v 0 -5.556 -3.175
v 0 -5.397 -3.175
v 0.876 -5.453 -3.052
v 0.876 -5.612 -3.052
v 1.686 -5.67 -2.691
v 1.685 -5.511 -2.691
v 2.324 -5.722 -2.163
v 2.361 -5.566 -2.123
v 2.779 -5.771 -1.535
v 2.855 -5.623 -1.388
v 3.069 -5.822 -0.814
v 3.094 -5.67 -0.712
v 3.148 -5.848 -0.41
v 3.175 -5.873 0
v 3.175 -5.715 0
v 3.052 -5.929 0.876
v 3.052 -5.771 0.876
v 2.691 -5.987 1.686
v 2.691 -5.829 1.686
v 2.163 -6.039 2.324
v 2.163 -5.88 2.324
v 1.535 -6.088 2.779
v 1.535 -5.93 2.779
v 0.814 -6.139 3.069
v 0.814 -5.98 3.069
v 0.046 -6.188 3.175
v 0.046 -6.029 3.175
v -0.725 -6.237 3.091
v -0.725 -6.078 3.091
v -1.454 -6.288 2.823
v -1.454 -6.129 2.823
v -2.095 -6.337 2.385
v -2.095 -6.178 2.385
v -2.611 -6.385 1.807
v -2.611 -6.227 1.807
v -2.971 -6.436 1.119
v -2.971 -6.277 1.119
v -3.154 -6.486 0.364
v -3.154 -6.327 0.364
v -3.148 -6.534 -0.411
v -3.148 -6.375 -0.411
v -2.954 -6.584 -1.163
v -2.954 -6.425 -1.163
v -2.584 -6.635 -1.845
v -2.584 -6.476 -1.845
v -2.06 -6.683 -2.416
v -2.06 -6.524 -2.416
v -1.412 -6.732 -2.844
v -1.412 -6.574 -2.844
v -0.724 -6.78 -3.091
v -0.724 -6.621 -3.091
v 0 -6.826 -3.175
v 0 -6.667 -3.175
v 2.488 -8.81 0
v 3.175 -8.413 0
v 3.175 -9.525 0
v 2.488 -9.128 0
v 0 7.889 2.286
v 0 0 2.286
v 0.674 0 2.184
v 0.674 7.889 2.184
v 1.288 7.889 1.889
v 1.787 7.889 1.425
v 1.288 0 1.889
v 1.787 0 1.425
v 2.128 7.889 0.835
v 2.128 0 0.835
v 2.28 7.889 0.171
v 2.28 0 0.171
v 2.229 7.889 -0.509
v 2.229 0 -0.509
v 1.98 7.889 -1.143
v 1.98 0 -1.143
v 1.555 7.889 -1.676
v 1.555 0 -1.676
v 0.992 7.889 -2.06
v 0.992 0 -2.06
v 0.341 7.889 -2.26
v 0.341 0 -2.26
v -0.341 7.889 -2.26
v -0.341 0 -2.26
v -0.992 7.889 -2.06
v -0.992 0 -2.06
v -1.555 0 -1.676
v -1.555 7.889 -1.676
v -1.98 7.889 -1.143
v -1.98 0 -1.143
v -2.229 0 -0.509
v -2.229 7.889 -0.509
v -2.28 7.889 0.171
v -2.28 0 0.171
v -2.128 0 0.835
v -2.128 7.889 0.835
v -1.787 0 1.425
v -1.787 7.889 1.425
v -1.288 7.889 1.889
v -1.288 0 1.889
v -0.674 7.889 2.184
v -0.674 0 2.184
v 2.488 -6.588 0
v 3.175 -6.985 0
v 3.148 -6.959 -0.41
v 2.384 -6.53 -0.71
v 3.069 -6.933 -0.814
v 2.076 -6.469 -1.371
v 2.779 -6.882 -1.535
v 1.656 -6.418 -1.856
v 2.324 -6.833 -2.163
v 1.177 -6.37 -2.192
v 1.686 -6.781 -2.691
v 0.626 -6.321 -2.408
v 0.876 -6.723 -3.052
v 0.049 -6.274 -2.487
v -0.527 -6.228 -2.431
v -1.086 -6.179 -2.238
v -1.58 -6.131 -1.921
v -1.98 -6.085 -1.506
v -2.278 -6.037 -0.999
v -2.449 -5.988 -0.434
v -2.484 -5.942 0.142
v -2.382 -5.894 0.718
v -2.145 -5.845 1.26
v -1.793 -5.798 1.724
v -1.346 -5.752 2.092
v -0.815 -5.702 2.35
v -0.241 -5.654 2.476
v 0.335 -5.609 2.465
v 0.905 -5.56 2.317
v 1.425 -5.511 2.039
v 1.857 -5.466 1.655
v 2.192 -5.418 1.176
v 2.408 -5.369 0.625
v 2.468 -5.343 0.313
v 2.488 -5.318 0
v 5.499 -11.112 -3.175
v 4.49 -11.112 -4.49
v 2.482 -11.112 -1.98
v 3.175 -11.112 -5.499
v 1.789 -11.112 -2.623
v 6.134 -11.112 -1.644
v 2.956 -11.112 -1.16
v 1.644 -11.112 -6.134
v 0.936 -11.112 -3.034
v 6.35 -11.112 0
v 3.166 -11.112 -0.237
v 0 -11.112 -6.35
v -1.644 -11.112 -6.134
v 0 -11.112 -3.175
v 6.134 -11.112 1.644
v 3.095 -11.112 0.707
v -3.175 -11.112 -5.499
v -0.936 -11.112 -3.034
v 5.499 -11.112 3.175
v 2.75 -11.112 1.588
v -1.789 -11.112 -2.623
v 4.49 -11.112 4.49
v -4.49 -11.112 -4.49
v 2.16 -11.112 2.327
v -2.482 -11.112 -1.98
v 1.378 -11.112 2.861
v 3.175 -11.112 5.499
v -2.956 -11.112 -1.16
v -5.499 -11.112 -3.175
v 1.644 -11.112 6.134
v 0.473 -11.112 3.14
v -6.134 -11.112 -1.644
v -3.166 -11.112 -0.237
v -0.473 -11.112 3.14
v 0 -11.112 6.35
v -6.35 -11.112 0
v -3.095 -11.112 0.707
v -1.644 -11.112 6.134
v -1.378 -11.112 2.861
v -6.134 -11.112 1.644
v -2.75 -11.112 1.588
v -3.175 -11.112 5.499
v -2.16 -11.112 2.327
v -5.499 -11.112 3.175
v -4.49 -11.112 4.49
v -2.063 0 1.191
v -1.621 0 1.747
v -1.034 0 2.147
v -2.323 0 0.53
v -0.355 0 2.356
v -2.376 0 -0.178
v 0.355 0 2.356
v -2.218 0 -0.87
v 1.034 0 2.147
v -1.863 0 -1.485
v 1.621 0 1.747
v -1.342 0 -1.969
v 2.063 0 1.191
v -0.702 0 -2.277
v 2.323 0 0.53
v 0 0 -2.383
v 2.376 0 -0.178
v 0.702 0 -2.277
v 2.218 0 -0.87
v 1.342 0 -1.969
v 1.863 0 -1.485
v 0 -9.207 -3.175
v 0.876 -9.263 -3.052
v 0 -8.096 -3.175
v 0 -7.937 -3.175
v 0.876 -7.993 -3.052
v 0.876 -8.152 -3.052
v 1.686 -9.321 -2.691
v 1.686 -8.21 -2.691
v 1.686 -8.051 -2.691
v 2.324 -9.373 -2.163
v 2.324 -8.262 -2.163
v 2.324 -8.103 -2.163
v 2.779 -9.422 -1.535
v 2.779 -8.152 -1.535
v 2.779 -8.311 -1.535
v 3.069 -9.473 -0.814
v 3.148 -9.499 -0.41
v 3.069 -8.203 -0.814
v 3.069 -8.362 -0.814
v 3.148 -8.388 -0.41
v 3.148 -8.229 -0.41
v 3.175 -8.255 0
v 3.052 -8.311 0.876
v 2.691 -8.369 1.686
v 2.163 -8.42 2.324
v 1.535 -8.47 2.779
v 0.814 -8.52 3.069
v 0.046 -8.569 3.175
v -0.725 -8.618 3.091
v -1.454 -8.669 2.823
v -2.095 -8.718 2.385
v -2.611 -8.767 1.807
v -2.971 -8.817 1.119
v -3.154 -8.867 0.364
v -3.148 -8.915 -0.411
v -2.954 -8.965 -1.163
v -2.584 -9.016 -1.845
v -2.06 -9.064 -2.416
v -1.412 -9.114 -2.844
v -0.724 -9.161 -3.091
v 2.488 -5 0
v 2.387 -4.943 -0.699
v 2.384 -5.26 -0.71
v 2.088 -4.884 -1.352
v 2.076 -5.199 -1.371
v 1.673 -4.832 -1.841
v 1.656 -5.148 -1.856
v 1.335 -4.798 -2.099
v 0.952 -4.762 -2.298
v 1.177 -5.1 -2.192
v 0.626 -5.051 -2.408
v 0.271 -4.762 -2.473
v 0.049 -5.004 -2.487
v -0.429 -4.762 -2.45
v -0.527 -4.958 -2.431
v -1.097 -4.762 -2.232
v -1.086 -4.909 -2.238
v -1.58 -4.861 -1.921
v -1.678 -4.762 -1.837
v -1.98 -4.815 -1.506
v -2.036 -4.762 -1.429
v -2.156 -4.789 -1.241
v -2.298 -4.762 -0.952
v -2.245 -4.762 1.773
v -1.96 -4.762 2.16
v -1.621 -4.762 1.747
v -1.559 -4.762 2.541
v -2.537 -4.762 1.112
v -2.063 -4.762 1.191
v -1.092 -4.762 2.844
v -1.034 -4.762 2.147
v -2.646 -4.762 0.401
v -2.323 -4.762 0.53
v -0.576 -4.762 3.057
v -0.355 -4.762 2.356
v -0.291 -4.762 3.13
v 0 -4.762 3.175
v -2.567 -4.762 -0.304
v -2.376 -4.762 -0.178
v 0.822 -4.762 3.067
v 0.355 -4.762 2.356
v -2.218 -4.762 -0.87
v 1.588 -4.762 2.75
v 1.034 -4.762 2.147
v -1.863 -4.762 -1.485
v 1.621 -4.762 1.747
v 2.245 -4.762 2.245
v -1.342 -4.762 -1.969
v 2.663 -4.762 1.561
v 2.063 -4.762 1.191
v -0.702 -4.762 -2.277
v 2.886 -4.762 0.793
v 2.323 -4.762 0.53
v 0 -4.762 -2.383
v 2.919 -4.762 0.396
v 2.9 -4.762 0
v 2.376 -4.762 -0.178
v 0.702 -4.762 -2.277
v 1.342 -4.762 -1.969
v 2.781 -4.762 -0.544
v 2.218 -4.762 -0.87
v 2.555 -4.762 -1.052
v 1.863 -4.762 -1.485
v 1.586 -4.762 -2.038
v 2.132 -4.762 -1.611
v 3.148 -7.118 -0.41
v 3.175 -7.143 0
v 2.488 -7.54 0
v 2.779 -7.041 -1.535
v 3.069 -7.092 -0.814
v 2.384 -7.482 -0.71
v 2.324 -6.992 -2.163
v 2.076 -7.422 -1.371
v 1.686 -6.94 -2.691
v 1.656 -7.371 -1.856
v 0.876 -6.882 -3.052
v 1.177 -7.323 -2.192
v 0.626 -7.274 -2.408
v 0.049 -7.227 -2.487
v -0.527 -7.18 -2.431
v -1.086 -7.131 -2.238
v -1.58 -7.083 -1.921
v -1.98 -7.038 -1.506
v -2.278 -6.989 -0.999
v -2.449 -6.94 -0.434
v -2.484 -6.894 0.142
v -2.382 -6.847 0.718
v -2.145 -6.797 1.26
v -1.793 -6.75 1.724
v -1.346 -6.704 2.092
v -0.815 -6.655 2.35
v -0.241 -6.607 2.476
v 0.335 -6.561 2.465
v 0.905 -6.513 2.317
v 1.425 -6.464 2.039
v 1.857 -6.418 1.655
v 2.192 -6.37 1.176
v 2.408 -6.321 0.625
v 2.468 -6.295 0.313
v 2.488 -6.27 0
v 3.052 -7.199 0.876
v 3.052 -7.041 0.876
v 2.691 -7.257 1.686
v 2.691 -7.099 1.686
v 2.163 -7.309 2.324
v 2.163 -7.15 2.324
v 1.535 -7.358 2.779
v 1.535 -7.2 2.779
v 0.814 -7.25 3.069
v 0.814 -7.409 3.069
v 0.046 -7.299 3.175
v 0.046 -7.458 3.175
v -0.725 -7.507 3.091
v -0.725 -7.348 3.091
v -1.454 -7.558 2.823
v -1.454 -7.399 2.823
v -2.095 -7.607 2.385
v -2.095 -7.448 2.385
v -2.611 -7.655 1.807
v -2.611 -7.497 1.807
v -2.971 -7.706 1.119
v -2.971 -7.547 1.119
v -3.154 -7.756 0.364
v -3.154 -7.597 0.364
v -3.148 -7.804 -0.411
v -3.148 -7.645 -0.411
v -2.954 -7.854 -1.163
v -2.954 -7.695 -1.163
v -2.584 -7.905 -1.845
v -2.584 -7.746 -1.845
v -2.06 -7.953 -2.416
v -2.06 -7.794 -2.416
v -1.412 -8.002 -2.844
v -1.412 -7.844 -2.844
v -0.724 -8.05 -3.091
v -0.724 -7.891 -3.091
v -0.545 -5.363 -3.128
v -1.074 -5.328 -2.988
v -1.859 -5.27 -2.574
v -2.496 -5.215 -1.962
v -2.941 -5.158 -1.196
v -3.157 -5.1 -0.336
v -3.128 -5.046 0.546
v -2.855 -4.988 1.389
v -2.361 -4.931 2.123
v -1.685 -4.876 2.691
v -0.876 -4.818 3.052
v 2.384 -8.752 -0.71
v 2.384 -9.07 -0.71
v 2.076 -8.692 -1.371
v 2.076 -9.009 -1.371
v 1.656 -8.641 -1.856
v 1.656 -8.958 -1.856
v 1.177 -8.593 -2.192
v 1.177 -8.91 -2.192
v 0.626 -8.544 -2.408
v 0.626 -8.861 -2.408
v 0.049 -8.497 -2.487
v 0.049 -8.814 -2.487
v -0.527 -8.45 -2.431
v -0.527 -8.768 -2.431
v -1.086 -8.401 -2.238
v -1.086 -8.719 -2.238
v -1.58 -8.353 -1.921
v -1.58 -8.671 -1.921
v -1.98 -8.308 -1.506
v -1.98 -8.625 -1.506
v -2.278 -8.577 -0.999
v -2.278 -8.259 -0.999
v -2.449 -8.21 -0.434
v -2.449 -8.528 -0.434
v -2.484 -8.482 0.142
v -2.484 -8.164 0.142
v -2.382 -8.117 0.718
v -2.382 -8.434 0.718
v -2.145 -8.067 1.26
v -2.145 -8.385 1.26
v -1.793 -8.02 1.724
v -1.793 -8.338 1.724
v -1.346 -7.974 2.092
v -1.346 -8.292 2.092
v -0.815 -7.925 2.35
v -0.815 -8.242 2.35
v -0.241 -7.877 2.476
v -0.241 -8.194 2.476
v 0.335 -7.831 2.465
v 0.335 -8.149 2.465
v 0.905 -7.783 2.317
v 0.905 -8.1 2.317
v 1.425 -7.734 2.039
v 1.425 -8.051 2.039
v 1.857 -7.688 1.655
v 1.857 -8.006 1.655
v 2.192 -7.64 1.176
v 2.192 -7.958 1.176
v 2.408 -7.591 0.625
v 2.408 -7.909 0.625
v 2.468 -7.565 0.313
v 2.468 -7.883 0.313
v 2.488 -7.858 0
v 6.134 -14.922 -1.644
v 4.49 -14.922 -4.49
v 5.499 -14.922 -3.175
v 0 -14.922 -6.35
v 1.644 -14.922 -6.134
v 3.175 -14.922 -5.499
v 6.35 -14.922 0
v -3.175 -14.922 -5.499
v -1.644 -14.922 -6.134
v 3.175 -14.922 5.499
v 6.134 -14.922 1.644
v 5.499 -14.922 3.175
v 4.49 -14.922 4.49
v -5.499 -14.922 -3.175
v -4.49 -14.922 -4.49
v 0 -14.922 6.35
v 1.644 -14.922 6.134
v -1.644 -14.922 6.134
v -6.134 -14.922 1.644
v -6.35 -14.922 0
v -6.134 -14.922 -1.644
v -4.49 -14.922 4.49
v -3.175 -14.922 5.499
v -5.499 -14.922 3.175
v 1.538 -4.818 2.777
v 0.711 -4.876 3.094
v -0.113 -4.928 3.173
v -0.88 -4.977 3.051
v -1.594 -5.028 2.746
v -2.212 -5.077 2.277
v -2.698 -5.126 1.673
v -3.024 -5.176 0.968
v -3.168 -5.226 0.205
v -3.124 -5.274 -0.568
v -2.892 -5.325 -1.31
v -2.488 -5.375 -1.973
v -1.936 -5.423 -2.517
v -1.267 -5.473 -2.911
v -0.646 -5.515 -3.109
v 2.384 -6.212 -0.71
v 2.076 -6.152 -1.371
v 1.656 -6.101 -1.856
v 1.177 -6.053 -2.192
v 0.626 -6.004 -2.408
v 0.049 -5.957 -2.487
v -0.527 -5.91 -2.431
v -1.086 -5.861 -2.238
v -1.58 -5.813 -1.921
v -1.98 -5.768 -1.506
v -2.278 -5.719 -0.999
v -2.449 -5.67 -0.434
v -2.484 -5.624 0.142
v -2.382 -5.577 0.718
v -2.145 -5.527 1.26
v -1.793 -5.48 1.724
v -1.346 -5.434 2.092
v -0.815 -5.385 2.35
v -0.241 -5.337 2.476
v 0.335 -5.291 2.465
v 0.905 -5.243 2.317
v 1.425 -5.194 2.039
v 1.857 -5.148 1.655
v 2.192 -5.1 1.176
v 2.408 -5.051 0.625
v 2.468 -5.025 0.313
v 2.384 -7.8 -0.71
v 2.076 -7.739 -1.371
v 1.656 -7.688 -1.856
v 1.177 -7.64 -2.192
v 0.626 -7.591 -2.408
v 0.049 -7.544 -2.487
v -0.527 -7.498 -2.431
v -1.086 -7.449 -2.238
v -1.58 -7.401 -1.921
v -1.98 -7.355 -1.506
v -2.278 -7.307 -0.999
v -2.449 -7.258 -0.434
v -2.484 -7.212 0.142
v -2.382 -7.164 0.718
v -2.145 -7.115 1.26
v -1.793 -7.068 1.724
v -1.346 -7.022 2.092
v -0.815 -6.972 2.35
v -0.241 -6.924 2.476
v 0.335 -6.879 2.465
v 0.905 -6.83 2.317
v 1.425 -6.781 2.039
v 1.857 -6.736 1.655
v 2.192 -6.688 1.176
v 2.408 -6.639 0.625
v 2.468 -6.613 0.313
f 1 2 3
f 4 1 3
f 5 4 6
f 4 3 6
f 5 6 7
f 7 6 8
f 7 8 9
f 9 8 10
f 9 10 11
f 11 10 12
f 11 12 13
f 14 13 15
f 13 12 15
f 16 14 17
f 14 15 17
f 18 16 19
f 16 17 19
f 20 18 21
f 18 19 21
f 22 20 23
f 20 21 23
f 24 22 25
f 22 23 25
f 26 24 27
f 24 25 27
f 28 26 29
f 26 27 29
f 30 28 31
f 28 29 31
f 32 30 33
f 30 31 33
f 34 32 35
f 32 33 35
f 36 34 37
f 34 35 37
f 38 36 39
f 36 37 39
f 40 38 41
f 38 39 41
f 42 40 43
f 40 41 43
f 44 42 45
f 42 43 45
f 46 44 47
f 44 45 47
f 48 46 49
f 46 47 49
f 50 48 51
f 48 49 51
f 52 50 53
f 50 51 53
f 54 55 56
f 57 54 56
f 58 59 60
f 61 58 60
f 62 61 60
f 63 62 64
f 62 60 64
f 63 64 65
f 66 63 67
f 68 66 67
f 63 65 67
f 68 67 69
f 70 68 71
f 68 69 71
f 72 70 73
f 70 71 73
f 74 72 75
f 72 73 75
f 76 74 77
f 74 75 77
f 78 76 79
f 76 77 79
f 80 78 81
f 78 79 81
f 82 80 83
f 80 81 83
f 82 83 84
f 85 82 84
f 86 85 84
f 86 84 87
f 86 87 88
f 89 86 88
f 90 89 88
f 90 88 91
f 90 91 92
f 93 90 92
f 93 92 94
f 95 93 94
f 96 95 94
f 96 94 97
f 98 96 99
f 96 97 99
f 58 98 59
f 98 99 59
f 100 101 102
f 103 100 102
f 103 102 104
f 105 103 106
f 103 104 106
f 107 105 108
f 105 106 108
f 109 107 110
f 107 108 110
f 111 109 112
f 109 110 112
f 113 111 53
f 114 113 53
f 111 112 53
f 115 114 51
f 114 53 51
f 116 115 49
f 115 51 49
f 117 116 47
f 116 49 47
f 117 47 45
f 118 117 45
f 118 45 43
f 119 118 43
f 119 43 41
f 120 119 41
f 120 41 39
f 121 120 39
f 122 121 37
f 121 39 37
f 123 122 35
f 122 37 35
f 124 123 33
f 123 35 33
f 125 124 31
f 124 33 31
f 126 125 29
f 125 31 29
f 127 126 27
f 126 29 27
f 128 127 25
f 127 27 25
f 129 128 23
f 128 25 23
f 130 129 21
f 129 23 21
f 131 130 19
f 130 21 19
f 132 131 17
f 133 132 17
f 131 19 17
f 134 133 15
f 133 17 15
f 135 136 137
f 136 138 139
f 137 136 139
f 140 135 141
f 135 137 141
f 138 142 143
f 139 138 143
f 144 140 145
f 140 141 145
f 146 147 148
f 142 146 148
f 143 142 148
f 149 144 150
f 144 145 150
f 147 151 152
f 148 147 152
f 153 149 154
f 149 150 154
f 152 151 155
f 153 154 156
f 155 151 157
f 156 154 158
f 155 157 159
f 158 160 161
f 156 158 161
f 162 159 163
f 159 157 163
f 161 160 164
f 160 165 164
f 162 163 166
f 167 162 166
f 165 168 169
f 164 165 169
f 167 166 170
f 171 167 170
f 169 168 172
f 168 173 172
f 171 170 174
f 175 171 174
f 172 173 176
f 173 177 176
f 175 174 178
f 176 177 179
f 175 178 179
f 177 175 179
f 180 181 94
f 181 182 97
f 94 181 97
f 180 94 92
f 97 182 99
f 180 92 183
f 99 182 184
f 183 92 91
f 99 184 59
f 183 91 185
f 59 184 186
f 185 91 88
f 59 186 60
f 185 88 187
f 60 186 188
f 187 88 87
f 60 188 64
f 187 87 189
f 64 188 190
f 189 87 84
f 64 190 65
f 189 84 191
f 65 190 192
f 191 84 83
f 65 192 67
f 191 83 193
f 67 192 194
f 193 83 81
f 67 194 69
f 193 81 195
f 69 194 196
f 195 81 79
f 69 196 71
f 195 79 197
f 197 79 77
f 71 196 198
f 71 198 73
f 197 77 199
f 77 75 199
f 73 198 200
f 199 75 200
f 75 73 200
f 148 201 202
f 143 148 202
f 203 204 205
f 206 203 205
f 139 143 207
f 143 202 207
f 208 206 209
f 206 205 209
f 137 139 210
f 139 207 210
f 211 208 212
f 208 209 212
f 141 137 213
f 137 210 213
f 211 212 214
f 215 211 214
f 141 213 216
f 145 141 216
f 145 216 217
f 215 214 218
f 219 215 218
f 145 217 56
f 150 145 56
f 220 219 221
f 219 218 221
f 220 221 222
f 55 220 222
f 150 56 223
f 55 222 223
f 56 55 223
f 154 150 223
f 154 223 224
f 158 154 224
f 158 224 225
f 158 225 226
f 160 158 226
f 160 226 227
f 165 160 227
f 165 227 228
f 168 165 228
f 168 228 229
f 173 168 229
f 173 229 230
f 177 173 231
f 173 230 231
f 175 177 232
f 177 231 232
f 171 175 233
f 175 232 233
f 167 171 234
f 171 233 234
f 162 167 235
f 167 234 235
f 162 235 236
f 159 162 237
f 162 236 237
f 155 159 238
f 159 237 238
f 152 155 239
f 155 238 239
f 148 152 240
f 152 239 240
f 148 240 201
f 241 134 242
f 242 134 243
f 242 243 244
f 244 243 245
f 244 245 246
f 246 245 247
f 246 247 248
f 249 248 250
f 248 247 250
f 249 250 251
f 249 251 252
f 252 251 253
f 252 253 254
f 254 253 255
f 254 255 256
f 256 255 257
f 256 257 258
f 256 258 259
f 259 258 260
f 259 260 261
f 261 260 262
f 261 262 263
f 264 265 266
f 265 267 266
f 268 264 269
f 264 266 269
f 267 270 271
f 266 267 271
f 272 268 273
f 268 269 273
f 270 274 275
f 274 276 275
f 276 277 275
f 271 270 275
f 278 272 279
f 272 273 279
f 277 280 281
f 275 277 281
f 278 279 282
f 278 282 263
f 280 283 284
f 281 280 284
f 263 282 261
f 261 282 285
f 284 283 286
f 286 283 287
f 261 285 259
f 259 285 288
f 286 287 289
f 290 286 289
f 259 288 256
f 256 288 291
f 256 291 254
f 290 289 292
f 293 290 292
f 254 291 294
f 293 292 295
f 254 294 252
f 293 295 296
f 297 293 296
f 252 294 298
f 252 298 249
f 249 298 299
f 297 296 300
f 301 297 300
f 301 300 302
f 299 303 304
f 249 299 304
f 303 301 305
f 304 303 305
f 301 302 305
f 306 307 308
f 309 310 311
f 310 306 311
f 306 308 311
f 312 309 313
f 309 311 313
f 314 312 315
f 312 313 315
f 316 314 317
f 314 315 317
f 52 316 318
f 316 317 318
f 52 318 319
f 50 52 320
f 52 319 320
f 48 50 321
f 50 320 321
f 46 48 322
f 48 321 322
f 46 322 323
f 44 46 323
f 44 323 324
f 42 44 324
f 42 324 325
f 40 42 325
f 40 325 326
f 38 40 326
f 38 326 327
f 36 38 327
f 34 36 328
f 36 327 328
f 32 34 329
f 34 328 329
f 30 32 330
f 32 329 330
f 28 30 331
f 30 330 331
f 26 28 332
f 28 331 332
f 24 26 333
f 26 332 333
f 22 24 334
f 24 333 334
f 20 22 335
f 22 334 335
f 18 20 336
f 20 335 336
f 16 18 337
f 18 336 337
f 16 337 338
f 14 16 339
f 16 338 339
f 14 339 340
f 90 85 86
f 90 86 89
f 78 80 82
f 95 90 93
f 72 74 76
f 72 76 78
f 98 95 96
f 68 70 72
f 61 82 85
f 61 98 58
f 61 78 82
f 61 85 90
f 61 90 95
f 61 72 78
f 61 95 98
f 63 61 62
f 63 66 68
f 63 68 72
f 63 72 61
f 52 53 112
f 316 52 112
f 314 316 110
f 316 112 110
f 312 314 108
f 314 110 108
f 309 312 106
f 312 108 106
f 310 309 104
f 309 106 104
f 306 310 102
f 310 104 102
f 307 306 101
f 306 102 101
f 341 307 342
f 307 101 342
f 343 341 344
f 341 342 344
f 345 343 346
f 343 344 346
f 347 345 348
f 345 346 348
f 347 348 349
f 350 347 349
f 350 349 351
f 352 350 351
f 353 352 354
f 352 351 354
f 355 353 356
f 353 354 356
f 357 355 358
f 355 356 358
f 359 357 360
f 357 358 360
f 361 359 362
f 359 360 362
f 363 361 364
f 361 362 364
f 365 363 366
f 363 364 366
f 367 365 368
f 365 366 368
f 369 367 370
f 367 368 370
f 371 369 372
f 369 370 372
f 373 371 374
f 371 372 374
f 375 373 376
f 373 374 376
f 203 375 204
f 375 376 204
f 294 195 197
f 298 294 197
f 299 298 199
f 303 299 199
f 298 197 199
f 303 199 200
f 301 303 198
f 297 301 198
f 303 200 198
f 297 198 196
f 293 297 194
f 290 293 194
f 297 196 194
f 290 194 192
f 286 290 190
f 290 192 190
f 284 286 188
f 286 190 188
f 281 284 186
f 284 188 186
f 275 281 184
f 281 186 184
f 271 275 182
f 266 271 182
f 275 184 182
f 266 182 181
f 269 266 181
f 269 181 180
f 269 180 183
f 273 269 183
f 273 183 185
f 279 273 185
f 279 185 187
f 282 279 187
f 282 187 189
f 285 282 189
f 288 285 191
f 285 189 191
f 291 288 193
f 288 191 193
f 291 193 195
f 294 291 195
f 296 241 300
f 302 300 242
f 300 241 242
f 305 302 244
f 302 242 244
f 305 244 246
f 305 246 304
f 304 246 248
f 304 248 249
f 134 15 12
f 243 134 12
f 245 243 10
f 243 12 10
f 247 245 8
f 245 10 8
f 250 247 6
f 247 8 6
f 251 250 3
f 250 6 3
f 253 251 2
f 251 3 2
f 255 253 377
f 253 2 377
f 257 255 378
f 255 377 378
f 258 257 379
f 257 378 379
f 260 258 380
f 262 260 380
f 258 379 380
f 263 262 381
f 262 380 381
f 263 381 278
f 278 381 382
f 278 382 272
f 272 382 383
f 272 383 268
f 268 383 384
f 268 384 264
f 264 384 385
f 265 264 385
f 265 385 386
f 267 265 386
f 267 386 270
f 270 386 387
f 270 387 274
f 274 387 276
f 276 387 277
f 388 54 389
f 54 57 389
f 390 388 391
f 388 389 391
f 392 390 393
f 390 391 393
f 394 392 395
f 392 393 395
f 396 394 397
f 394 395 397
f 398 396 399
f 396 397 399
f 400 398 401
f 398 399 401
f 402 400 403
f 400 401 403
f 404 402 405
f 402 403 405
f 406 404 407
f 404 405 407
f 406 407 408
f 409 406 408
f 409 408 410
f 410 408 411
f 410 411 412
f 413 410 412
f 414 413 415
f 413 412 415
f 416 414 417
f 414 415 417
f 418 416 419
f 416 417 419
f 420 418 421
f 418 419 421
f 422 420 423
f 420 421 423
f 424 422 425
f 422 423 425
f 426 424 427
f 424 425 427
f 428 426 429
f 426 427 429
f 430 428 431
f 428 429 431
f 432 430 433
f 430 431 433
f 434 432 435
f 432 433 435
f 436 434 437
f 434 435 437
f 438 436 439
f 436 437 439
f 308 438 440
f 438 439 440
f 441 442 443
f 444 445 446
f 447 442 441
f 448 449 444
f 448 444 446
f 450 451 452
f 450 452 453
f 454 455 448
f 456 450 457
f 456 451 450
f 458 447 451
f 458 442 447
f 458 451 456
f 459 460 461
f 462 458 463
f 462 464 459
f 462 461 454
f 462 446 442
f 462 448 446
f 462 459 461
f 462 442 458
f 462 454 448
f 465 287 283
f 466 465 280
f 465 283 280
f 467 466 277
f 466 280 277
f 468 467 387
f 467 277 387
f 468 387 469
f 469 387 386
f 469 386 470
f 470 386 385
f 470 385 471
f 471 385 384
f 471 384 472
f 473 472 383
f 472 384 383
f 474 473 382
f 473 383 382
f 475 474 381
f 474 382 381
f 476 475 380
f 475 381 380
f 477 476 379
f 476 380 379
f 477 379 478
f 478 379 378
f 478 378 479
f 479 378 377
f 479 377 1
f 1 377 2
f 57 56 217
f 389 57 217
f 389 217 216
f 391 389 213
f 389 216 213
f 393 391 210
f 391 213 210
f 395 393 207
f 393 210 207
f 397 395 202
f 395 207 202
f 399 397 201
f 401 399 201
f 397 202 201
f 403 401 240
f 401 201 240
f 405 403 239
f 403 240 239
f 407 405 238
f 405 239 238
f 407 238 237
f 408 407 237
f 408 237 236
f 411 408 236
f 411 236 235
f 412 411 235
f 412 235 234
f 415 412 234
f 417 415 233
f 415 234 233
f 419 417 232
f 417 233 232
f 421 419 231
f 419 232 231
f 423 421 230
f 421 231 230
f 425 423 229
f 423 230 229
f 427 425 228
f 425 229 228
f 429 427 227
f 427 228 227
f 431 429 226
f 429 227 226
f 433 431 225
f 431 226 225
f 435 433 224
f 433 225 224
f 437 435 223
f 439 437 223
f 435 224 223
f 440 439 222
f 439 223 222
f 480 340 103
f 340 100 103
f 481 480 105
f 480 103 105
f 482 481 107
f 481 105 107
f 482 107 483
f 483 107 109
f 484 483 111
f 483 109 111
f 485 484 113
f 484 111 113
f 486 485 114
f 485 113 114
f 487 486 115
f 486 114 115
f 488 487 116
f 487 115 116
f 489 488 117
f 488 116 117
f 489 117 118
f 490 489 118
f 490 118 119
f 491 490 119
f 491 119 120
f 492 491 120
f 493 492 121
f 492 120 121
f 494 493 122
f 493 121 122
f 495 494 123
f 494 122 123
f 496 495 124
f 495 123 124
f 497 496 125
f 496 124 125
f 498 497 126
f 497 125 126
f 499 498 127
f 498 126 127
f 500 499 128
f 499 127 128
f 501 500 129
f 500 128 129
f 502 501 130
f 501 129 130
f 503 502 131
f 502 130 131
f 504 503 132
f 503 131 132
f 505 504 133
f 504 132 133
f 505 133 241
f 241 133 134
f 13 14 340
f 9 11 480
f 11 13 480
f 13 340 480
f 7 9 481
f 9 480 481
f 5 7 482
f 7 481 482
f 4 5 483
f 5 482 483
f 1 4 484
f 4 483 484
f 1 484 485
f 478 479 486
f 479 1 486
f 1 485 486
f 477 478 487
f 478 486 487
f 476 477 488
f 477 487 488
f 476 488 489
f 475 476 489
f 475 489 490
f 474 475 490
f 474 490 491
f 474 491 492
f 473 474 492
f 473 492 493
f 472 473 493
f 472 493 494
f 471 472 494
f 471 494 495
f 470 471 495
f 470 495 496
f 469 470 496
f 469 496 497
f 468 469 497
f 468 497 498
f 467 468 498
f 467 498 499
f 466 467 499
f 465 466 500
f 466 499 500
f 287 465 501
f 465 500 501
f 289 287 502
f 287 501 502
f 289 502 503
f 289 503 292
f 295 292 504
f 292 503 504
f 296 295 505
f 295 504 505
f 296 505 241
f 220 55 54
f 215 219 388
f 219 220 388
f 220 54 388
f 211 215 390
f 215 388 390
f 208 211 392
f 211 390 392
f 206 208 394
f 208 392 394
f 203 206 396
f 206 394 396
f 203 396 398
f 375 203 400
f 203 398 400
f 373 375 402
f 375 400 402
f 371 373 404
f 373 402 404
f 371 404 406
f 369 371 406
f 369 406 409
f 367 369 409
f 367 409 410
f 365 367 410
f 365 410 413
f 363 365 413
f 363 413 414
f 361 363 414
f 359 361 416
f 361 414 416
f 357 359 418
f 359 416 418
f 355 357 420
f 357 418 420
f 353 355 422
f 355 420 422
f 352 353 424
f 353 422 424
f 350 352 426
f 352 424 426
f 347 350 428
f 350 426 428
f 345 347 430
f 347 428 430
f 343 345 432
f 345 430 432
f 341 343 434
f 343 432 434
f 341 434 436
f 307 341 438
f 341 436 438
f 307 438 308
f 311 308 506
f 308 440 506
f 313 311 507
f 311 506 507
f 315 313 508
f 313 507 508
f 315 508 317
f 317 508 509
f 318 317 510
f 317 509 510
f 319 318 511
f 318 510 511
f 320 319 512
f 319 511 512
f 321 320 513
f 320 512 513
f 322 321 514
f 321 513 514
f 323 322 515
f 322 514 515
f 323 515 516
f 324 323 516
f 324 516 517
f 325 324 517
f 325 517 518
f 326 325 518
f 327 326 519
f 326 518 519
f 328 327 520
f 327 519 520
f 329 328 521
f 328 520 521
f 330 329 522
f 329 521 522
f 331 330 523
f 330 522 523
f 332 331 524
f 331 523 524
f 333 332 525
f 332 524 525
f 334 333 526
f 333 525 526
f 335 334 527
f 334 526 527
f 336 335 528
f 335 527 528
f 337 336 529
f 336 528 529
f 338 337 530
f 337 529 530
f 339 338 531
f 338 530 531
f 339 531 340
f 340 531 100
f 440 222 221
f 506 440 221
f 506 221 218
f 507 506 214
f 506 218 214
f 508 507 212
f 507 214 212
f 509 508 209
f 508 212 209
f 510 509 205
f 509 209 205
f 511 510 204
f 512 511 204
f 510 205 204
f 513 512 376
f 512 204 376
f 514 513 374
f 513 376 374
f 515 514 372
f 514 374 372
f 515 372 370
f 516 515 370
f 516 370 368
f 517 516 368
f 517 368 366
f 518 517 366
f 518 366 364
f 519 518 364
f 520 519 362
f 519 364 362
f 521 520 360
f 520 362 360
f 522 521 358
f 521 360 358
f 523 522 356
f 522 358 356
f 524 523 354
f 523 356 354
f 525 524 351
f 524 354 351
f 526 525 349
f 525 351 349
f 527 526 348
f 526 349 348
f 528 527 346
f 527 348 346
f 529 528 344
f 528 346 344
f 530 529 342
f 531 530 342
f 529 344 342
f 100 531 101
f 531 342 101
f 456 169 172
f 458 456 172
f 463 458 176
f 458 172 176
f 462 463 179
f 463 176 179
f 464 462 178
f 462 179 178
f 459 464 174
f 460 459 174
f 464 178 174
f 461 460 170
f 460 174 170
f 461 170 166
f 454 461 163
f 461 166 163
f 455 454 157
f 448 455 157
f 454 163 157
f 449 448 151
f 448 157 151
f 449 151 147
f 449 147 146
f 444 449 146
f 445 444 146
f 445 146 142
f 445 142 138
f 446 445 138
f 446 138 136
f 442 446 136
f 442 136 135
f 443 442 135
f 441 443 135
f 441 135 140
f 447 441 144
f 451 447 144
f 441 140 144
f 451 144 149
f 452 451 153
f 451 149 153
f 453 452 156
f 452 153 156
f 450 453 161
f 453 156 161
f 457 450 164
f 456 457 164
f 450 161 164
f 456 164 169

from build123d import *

# Parameters (mm, degrees)
SKETCH1_R           = 2.286
BOSS_EXTRUDE1_DEPTH = 7.88924
SKETCH2_R           = 2.38252
BOSS_EXTRUDE2_DEPTH = 4.762246
SKETCH3_R           = 3.175
BOSS_EXTRUDE3_DEPTH = 3.175
SKETCH4_R           = 3.175
BOSS_EXTRUDE4_DEPTH = 3.175
THREAD2_PITCH       = 1.27
SKETCH11_R          = 6.35
BOSS_EXTRUDE5_DEPTH = 3.81


with BuildPart() as part:
    # Sketch1 → Boss-Extrude1 (new body)
    with BuildSketch(Plane(origin=(0, 0, 0), x_dir=(1, 0, 0), z_dir=(0, 1, 0))):
        with Locations(Location((0, 0, 0), (0, 0, 270))):
            Circle(SKETCH1_R)
    extrude(amount=BOSS_EXTRUDE1_DEPTH)

    # Sketch2 → Boss-Extrude2 (add)
    with BuildSketch(Plane(origin=(0, 0, 0), x_dir=(-1, 0, 0), z_dir=(0, -1, 0))):
        with Locations(Location((0, 0, 0), (0, 0, 90))):
            Circle(SKETCH2_R)
    extrude(amount=BOSS_EXTRUDE2_DEPTH)

    # Sketch3 → Boss-Extrude3 (add)
    with BuildSketch(Plane(origin=(0, -4.762246, 0), x_dir=(-1, 0, 0), z_dir=(0, -1, 0))):
        with Locations(Location((0, 0, 0), (0, 0, 90))):
            Circle(SKETCH3_R)
    extrude(amount=BOSS_EXTRUDE3_DEPTH)

    # Sketch4 → Boss-Extrude4 (add)
    with BuildSketch(Plane(origin=(0, -7.937246, 0), x_dir=(-1, 0, 0), z_dir=(0, -1, 0))):
        with Locations(Location((0, 0, 0), (0, 0, 90))):
            Circle(SKETCH4_R)
    extrude(amount=BOSS_EXTRUDE4_DEPTH)

    # Thread2: the profile of Thread Profile3 profile screwed along a right-hand helix of 3.75 turns, 8 arcs to a turn; built about Z, then put on its axis
    thread2_z = Axis((0, 0, 0), (0, 0, 1))
    thread2_corners = [(3.1753, 0, -0.000173205), (3.1753, 0, 1.111423202), (2.487592339, 0, 0.714374998), (2.487592339, 0, 0.396874998)]
    with BuildLine(mode=Mode.PRIVATE) as thread2_profile:
        Line(thread2_corners[0], thread2_corners[1])
        Line(thread2_corners[1], thread2_corners[2])
        Line(thread2_corners[2], thread2_corners[3])
        Line(thread2_corners[3], thread2_corners[0])
    thread2_cap = Face(thread2_profile.wire())
    thread2_turn_angles = [0, 22.5, 45, 67.5, 90, 112.5, 135, 157.5, 180, 202.5, 225, 247.5, 270, 292.5, 315, 337.5, 360]
    thread2_turn_weights = [1, 0.9238795325112867, 1, 0.9238795325112867, 1, 0.9238795325112867, 1, 0.9238795325112867, 1, 0.9238795325112867, 1, 0.9238795325112867, 1, 0.9238795325112867, 1, 0.9238795325112867, 1]
    thread2_turn_rails = [Edge.make_bspline([Vector(p[0], p[1], 0).rotate(thread2_z, thread2_turn_angles[k]) / thread2_turn_weights[k] + Vector(0, 0, p[2] + THREAD2_PITCH * thread2_turn_angles[k] / 360) for k in range(17)], [0, 0, 0, 1, 1, 2, 2, 3, 3, 4, 4, 5, 5, 6, 6, 7, 7, 8, 8, 8], 2, thread2_turn_weights) for p in thread2_corners]
    thread2_turn_sides = [Face.make_surface_from_curves(thread2_turn_rails[p[0]], thread2_turn_rails[p[1]]) for p in [(0, 1), (1, 2), (2, 3), (3, 0)]]
    thread2_last_angles = [1080, 1102.5, 1125, 1147.5, 1170, 1192.5, 1215, 1237.5, 1260, 1282.5, 1305, 1327.5, 1350]
    thread2_last_weights = [1, 0.9238795325112867, 1, 0.9238795325112867, 1, 0.9238795325112867, 1, 0.9238795325112867, 1, 0.9238795325112867, 1, 0.9238795325112883, 1]
    thread2_last_rails = [Edge.make_bspline([Vector(p[0], p[1], 0).rotate(thread2_z, thread2_last_angles[k]) / thread2_last_weights[k] + Vector(0, 0, p[2] + THREAD2_PITCH * thread2_last_angles[k] / 360) for k in range(13)], [0, 0, 0, 1, 1, 2, 2, 3, 3, 4, 4, 5, 5, 6, 6, 6], 2, thread2_last_weights) for p in thread2_corners]
    thread2_last_sides = [Face.make_surface_from_curves(thread2_last_rails[p[0]], thread2_last_rails[p[1]]) for p in [(0, 1), (1, 2), (2, 3), (3, 0)]]
    thread2 = Plane(origin=(0, -9.524746, 0), x_dir=(1, 0, 0), z_dir=(0, 1, 0)) * Solid(Shell([*[p.moved(Location((0, 0, THREAD2_PITCH * i))) for i in range(3) for p in thread2_turn_sides], *thread2_last_sides, thread2_cap, thread2_cap.rotate(thread2_z, 1350).moved(Location((0, 0, THREAD2_PITCH * 1350 / 360)))]))
    add(thread2, mode=Mode.SUBTRACT)

    # Sketch11 → Boss-Extrude5 (add)
    with BuildSketch(Plane(origin=(0, -11.112246, 0), x_dir=(-1, 0, 0), z_dir=(0, -1, 0))):
        with Locations(Location((0, 0, 0), (0, 0, 270))):
            Circle(SKETCH11_R)
    extrude(amount=BOSS_EXTRUDE5_DEPTH)


solid = part.part
